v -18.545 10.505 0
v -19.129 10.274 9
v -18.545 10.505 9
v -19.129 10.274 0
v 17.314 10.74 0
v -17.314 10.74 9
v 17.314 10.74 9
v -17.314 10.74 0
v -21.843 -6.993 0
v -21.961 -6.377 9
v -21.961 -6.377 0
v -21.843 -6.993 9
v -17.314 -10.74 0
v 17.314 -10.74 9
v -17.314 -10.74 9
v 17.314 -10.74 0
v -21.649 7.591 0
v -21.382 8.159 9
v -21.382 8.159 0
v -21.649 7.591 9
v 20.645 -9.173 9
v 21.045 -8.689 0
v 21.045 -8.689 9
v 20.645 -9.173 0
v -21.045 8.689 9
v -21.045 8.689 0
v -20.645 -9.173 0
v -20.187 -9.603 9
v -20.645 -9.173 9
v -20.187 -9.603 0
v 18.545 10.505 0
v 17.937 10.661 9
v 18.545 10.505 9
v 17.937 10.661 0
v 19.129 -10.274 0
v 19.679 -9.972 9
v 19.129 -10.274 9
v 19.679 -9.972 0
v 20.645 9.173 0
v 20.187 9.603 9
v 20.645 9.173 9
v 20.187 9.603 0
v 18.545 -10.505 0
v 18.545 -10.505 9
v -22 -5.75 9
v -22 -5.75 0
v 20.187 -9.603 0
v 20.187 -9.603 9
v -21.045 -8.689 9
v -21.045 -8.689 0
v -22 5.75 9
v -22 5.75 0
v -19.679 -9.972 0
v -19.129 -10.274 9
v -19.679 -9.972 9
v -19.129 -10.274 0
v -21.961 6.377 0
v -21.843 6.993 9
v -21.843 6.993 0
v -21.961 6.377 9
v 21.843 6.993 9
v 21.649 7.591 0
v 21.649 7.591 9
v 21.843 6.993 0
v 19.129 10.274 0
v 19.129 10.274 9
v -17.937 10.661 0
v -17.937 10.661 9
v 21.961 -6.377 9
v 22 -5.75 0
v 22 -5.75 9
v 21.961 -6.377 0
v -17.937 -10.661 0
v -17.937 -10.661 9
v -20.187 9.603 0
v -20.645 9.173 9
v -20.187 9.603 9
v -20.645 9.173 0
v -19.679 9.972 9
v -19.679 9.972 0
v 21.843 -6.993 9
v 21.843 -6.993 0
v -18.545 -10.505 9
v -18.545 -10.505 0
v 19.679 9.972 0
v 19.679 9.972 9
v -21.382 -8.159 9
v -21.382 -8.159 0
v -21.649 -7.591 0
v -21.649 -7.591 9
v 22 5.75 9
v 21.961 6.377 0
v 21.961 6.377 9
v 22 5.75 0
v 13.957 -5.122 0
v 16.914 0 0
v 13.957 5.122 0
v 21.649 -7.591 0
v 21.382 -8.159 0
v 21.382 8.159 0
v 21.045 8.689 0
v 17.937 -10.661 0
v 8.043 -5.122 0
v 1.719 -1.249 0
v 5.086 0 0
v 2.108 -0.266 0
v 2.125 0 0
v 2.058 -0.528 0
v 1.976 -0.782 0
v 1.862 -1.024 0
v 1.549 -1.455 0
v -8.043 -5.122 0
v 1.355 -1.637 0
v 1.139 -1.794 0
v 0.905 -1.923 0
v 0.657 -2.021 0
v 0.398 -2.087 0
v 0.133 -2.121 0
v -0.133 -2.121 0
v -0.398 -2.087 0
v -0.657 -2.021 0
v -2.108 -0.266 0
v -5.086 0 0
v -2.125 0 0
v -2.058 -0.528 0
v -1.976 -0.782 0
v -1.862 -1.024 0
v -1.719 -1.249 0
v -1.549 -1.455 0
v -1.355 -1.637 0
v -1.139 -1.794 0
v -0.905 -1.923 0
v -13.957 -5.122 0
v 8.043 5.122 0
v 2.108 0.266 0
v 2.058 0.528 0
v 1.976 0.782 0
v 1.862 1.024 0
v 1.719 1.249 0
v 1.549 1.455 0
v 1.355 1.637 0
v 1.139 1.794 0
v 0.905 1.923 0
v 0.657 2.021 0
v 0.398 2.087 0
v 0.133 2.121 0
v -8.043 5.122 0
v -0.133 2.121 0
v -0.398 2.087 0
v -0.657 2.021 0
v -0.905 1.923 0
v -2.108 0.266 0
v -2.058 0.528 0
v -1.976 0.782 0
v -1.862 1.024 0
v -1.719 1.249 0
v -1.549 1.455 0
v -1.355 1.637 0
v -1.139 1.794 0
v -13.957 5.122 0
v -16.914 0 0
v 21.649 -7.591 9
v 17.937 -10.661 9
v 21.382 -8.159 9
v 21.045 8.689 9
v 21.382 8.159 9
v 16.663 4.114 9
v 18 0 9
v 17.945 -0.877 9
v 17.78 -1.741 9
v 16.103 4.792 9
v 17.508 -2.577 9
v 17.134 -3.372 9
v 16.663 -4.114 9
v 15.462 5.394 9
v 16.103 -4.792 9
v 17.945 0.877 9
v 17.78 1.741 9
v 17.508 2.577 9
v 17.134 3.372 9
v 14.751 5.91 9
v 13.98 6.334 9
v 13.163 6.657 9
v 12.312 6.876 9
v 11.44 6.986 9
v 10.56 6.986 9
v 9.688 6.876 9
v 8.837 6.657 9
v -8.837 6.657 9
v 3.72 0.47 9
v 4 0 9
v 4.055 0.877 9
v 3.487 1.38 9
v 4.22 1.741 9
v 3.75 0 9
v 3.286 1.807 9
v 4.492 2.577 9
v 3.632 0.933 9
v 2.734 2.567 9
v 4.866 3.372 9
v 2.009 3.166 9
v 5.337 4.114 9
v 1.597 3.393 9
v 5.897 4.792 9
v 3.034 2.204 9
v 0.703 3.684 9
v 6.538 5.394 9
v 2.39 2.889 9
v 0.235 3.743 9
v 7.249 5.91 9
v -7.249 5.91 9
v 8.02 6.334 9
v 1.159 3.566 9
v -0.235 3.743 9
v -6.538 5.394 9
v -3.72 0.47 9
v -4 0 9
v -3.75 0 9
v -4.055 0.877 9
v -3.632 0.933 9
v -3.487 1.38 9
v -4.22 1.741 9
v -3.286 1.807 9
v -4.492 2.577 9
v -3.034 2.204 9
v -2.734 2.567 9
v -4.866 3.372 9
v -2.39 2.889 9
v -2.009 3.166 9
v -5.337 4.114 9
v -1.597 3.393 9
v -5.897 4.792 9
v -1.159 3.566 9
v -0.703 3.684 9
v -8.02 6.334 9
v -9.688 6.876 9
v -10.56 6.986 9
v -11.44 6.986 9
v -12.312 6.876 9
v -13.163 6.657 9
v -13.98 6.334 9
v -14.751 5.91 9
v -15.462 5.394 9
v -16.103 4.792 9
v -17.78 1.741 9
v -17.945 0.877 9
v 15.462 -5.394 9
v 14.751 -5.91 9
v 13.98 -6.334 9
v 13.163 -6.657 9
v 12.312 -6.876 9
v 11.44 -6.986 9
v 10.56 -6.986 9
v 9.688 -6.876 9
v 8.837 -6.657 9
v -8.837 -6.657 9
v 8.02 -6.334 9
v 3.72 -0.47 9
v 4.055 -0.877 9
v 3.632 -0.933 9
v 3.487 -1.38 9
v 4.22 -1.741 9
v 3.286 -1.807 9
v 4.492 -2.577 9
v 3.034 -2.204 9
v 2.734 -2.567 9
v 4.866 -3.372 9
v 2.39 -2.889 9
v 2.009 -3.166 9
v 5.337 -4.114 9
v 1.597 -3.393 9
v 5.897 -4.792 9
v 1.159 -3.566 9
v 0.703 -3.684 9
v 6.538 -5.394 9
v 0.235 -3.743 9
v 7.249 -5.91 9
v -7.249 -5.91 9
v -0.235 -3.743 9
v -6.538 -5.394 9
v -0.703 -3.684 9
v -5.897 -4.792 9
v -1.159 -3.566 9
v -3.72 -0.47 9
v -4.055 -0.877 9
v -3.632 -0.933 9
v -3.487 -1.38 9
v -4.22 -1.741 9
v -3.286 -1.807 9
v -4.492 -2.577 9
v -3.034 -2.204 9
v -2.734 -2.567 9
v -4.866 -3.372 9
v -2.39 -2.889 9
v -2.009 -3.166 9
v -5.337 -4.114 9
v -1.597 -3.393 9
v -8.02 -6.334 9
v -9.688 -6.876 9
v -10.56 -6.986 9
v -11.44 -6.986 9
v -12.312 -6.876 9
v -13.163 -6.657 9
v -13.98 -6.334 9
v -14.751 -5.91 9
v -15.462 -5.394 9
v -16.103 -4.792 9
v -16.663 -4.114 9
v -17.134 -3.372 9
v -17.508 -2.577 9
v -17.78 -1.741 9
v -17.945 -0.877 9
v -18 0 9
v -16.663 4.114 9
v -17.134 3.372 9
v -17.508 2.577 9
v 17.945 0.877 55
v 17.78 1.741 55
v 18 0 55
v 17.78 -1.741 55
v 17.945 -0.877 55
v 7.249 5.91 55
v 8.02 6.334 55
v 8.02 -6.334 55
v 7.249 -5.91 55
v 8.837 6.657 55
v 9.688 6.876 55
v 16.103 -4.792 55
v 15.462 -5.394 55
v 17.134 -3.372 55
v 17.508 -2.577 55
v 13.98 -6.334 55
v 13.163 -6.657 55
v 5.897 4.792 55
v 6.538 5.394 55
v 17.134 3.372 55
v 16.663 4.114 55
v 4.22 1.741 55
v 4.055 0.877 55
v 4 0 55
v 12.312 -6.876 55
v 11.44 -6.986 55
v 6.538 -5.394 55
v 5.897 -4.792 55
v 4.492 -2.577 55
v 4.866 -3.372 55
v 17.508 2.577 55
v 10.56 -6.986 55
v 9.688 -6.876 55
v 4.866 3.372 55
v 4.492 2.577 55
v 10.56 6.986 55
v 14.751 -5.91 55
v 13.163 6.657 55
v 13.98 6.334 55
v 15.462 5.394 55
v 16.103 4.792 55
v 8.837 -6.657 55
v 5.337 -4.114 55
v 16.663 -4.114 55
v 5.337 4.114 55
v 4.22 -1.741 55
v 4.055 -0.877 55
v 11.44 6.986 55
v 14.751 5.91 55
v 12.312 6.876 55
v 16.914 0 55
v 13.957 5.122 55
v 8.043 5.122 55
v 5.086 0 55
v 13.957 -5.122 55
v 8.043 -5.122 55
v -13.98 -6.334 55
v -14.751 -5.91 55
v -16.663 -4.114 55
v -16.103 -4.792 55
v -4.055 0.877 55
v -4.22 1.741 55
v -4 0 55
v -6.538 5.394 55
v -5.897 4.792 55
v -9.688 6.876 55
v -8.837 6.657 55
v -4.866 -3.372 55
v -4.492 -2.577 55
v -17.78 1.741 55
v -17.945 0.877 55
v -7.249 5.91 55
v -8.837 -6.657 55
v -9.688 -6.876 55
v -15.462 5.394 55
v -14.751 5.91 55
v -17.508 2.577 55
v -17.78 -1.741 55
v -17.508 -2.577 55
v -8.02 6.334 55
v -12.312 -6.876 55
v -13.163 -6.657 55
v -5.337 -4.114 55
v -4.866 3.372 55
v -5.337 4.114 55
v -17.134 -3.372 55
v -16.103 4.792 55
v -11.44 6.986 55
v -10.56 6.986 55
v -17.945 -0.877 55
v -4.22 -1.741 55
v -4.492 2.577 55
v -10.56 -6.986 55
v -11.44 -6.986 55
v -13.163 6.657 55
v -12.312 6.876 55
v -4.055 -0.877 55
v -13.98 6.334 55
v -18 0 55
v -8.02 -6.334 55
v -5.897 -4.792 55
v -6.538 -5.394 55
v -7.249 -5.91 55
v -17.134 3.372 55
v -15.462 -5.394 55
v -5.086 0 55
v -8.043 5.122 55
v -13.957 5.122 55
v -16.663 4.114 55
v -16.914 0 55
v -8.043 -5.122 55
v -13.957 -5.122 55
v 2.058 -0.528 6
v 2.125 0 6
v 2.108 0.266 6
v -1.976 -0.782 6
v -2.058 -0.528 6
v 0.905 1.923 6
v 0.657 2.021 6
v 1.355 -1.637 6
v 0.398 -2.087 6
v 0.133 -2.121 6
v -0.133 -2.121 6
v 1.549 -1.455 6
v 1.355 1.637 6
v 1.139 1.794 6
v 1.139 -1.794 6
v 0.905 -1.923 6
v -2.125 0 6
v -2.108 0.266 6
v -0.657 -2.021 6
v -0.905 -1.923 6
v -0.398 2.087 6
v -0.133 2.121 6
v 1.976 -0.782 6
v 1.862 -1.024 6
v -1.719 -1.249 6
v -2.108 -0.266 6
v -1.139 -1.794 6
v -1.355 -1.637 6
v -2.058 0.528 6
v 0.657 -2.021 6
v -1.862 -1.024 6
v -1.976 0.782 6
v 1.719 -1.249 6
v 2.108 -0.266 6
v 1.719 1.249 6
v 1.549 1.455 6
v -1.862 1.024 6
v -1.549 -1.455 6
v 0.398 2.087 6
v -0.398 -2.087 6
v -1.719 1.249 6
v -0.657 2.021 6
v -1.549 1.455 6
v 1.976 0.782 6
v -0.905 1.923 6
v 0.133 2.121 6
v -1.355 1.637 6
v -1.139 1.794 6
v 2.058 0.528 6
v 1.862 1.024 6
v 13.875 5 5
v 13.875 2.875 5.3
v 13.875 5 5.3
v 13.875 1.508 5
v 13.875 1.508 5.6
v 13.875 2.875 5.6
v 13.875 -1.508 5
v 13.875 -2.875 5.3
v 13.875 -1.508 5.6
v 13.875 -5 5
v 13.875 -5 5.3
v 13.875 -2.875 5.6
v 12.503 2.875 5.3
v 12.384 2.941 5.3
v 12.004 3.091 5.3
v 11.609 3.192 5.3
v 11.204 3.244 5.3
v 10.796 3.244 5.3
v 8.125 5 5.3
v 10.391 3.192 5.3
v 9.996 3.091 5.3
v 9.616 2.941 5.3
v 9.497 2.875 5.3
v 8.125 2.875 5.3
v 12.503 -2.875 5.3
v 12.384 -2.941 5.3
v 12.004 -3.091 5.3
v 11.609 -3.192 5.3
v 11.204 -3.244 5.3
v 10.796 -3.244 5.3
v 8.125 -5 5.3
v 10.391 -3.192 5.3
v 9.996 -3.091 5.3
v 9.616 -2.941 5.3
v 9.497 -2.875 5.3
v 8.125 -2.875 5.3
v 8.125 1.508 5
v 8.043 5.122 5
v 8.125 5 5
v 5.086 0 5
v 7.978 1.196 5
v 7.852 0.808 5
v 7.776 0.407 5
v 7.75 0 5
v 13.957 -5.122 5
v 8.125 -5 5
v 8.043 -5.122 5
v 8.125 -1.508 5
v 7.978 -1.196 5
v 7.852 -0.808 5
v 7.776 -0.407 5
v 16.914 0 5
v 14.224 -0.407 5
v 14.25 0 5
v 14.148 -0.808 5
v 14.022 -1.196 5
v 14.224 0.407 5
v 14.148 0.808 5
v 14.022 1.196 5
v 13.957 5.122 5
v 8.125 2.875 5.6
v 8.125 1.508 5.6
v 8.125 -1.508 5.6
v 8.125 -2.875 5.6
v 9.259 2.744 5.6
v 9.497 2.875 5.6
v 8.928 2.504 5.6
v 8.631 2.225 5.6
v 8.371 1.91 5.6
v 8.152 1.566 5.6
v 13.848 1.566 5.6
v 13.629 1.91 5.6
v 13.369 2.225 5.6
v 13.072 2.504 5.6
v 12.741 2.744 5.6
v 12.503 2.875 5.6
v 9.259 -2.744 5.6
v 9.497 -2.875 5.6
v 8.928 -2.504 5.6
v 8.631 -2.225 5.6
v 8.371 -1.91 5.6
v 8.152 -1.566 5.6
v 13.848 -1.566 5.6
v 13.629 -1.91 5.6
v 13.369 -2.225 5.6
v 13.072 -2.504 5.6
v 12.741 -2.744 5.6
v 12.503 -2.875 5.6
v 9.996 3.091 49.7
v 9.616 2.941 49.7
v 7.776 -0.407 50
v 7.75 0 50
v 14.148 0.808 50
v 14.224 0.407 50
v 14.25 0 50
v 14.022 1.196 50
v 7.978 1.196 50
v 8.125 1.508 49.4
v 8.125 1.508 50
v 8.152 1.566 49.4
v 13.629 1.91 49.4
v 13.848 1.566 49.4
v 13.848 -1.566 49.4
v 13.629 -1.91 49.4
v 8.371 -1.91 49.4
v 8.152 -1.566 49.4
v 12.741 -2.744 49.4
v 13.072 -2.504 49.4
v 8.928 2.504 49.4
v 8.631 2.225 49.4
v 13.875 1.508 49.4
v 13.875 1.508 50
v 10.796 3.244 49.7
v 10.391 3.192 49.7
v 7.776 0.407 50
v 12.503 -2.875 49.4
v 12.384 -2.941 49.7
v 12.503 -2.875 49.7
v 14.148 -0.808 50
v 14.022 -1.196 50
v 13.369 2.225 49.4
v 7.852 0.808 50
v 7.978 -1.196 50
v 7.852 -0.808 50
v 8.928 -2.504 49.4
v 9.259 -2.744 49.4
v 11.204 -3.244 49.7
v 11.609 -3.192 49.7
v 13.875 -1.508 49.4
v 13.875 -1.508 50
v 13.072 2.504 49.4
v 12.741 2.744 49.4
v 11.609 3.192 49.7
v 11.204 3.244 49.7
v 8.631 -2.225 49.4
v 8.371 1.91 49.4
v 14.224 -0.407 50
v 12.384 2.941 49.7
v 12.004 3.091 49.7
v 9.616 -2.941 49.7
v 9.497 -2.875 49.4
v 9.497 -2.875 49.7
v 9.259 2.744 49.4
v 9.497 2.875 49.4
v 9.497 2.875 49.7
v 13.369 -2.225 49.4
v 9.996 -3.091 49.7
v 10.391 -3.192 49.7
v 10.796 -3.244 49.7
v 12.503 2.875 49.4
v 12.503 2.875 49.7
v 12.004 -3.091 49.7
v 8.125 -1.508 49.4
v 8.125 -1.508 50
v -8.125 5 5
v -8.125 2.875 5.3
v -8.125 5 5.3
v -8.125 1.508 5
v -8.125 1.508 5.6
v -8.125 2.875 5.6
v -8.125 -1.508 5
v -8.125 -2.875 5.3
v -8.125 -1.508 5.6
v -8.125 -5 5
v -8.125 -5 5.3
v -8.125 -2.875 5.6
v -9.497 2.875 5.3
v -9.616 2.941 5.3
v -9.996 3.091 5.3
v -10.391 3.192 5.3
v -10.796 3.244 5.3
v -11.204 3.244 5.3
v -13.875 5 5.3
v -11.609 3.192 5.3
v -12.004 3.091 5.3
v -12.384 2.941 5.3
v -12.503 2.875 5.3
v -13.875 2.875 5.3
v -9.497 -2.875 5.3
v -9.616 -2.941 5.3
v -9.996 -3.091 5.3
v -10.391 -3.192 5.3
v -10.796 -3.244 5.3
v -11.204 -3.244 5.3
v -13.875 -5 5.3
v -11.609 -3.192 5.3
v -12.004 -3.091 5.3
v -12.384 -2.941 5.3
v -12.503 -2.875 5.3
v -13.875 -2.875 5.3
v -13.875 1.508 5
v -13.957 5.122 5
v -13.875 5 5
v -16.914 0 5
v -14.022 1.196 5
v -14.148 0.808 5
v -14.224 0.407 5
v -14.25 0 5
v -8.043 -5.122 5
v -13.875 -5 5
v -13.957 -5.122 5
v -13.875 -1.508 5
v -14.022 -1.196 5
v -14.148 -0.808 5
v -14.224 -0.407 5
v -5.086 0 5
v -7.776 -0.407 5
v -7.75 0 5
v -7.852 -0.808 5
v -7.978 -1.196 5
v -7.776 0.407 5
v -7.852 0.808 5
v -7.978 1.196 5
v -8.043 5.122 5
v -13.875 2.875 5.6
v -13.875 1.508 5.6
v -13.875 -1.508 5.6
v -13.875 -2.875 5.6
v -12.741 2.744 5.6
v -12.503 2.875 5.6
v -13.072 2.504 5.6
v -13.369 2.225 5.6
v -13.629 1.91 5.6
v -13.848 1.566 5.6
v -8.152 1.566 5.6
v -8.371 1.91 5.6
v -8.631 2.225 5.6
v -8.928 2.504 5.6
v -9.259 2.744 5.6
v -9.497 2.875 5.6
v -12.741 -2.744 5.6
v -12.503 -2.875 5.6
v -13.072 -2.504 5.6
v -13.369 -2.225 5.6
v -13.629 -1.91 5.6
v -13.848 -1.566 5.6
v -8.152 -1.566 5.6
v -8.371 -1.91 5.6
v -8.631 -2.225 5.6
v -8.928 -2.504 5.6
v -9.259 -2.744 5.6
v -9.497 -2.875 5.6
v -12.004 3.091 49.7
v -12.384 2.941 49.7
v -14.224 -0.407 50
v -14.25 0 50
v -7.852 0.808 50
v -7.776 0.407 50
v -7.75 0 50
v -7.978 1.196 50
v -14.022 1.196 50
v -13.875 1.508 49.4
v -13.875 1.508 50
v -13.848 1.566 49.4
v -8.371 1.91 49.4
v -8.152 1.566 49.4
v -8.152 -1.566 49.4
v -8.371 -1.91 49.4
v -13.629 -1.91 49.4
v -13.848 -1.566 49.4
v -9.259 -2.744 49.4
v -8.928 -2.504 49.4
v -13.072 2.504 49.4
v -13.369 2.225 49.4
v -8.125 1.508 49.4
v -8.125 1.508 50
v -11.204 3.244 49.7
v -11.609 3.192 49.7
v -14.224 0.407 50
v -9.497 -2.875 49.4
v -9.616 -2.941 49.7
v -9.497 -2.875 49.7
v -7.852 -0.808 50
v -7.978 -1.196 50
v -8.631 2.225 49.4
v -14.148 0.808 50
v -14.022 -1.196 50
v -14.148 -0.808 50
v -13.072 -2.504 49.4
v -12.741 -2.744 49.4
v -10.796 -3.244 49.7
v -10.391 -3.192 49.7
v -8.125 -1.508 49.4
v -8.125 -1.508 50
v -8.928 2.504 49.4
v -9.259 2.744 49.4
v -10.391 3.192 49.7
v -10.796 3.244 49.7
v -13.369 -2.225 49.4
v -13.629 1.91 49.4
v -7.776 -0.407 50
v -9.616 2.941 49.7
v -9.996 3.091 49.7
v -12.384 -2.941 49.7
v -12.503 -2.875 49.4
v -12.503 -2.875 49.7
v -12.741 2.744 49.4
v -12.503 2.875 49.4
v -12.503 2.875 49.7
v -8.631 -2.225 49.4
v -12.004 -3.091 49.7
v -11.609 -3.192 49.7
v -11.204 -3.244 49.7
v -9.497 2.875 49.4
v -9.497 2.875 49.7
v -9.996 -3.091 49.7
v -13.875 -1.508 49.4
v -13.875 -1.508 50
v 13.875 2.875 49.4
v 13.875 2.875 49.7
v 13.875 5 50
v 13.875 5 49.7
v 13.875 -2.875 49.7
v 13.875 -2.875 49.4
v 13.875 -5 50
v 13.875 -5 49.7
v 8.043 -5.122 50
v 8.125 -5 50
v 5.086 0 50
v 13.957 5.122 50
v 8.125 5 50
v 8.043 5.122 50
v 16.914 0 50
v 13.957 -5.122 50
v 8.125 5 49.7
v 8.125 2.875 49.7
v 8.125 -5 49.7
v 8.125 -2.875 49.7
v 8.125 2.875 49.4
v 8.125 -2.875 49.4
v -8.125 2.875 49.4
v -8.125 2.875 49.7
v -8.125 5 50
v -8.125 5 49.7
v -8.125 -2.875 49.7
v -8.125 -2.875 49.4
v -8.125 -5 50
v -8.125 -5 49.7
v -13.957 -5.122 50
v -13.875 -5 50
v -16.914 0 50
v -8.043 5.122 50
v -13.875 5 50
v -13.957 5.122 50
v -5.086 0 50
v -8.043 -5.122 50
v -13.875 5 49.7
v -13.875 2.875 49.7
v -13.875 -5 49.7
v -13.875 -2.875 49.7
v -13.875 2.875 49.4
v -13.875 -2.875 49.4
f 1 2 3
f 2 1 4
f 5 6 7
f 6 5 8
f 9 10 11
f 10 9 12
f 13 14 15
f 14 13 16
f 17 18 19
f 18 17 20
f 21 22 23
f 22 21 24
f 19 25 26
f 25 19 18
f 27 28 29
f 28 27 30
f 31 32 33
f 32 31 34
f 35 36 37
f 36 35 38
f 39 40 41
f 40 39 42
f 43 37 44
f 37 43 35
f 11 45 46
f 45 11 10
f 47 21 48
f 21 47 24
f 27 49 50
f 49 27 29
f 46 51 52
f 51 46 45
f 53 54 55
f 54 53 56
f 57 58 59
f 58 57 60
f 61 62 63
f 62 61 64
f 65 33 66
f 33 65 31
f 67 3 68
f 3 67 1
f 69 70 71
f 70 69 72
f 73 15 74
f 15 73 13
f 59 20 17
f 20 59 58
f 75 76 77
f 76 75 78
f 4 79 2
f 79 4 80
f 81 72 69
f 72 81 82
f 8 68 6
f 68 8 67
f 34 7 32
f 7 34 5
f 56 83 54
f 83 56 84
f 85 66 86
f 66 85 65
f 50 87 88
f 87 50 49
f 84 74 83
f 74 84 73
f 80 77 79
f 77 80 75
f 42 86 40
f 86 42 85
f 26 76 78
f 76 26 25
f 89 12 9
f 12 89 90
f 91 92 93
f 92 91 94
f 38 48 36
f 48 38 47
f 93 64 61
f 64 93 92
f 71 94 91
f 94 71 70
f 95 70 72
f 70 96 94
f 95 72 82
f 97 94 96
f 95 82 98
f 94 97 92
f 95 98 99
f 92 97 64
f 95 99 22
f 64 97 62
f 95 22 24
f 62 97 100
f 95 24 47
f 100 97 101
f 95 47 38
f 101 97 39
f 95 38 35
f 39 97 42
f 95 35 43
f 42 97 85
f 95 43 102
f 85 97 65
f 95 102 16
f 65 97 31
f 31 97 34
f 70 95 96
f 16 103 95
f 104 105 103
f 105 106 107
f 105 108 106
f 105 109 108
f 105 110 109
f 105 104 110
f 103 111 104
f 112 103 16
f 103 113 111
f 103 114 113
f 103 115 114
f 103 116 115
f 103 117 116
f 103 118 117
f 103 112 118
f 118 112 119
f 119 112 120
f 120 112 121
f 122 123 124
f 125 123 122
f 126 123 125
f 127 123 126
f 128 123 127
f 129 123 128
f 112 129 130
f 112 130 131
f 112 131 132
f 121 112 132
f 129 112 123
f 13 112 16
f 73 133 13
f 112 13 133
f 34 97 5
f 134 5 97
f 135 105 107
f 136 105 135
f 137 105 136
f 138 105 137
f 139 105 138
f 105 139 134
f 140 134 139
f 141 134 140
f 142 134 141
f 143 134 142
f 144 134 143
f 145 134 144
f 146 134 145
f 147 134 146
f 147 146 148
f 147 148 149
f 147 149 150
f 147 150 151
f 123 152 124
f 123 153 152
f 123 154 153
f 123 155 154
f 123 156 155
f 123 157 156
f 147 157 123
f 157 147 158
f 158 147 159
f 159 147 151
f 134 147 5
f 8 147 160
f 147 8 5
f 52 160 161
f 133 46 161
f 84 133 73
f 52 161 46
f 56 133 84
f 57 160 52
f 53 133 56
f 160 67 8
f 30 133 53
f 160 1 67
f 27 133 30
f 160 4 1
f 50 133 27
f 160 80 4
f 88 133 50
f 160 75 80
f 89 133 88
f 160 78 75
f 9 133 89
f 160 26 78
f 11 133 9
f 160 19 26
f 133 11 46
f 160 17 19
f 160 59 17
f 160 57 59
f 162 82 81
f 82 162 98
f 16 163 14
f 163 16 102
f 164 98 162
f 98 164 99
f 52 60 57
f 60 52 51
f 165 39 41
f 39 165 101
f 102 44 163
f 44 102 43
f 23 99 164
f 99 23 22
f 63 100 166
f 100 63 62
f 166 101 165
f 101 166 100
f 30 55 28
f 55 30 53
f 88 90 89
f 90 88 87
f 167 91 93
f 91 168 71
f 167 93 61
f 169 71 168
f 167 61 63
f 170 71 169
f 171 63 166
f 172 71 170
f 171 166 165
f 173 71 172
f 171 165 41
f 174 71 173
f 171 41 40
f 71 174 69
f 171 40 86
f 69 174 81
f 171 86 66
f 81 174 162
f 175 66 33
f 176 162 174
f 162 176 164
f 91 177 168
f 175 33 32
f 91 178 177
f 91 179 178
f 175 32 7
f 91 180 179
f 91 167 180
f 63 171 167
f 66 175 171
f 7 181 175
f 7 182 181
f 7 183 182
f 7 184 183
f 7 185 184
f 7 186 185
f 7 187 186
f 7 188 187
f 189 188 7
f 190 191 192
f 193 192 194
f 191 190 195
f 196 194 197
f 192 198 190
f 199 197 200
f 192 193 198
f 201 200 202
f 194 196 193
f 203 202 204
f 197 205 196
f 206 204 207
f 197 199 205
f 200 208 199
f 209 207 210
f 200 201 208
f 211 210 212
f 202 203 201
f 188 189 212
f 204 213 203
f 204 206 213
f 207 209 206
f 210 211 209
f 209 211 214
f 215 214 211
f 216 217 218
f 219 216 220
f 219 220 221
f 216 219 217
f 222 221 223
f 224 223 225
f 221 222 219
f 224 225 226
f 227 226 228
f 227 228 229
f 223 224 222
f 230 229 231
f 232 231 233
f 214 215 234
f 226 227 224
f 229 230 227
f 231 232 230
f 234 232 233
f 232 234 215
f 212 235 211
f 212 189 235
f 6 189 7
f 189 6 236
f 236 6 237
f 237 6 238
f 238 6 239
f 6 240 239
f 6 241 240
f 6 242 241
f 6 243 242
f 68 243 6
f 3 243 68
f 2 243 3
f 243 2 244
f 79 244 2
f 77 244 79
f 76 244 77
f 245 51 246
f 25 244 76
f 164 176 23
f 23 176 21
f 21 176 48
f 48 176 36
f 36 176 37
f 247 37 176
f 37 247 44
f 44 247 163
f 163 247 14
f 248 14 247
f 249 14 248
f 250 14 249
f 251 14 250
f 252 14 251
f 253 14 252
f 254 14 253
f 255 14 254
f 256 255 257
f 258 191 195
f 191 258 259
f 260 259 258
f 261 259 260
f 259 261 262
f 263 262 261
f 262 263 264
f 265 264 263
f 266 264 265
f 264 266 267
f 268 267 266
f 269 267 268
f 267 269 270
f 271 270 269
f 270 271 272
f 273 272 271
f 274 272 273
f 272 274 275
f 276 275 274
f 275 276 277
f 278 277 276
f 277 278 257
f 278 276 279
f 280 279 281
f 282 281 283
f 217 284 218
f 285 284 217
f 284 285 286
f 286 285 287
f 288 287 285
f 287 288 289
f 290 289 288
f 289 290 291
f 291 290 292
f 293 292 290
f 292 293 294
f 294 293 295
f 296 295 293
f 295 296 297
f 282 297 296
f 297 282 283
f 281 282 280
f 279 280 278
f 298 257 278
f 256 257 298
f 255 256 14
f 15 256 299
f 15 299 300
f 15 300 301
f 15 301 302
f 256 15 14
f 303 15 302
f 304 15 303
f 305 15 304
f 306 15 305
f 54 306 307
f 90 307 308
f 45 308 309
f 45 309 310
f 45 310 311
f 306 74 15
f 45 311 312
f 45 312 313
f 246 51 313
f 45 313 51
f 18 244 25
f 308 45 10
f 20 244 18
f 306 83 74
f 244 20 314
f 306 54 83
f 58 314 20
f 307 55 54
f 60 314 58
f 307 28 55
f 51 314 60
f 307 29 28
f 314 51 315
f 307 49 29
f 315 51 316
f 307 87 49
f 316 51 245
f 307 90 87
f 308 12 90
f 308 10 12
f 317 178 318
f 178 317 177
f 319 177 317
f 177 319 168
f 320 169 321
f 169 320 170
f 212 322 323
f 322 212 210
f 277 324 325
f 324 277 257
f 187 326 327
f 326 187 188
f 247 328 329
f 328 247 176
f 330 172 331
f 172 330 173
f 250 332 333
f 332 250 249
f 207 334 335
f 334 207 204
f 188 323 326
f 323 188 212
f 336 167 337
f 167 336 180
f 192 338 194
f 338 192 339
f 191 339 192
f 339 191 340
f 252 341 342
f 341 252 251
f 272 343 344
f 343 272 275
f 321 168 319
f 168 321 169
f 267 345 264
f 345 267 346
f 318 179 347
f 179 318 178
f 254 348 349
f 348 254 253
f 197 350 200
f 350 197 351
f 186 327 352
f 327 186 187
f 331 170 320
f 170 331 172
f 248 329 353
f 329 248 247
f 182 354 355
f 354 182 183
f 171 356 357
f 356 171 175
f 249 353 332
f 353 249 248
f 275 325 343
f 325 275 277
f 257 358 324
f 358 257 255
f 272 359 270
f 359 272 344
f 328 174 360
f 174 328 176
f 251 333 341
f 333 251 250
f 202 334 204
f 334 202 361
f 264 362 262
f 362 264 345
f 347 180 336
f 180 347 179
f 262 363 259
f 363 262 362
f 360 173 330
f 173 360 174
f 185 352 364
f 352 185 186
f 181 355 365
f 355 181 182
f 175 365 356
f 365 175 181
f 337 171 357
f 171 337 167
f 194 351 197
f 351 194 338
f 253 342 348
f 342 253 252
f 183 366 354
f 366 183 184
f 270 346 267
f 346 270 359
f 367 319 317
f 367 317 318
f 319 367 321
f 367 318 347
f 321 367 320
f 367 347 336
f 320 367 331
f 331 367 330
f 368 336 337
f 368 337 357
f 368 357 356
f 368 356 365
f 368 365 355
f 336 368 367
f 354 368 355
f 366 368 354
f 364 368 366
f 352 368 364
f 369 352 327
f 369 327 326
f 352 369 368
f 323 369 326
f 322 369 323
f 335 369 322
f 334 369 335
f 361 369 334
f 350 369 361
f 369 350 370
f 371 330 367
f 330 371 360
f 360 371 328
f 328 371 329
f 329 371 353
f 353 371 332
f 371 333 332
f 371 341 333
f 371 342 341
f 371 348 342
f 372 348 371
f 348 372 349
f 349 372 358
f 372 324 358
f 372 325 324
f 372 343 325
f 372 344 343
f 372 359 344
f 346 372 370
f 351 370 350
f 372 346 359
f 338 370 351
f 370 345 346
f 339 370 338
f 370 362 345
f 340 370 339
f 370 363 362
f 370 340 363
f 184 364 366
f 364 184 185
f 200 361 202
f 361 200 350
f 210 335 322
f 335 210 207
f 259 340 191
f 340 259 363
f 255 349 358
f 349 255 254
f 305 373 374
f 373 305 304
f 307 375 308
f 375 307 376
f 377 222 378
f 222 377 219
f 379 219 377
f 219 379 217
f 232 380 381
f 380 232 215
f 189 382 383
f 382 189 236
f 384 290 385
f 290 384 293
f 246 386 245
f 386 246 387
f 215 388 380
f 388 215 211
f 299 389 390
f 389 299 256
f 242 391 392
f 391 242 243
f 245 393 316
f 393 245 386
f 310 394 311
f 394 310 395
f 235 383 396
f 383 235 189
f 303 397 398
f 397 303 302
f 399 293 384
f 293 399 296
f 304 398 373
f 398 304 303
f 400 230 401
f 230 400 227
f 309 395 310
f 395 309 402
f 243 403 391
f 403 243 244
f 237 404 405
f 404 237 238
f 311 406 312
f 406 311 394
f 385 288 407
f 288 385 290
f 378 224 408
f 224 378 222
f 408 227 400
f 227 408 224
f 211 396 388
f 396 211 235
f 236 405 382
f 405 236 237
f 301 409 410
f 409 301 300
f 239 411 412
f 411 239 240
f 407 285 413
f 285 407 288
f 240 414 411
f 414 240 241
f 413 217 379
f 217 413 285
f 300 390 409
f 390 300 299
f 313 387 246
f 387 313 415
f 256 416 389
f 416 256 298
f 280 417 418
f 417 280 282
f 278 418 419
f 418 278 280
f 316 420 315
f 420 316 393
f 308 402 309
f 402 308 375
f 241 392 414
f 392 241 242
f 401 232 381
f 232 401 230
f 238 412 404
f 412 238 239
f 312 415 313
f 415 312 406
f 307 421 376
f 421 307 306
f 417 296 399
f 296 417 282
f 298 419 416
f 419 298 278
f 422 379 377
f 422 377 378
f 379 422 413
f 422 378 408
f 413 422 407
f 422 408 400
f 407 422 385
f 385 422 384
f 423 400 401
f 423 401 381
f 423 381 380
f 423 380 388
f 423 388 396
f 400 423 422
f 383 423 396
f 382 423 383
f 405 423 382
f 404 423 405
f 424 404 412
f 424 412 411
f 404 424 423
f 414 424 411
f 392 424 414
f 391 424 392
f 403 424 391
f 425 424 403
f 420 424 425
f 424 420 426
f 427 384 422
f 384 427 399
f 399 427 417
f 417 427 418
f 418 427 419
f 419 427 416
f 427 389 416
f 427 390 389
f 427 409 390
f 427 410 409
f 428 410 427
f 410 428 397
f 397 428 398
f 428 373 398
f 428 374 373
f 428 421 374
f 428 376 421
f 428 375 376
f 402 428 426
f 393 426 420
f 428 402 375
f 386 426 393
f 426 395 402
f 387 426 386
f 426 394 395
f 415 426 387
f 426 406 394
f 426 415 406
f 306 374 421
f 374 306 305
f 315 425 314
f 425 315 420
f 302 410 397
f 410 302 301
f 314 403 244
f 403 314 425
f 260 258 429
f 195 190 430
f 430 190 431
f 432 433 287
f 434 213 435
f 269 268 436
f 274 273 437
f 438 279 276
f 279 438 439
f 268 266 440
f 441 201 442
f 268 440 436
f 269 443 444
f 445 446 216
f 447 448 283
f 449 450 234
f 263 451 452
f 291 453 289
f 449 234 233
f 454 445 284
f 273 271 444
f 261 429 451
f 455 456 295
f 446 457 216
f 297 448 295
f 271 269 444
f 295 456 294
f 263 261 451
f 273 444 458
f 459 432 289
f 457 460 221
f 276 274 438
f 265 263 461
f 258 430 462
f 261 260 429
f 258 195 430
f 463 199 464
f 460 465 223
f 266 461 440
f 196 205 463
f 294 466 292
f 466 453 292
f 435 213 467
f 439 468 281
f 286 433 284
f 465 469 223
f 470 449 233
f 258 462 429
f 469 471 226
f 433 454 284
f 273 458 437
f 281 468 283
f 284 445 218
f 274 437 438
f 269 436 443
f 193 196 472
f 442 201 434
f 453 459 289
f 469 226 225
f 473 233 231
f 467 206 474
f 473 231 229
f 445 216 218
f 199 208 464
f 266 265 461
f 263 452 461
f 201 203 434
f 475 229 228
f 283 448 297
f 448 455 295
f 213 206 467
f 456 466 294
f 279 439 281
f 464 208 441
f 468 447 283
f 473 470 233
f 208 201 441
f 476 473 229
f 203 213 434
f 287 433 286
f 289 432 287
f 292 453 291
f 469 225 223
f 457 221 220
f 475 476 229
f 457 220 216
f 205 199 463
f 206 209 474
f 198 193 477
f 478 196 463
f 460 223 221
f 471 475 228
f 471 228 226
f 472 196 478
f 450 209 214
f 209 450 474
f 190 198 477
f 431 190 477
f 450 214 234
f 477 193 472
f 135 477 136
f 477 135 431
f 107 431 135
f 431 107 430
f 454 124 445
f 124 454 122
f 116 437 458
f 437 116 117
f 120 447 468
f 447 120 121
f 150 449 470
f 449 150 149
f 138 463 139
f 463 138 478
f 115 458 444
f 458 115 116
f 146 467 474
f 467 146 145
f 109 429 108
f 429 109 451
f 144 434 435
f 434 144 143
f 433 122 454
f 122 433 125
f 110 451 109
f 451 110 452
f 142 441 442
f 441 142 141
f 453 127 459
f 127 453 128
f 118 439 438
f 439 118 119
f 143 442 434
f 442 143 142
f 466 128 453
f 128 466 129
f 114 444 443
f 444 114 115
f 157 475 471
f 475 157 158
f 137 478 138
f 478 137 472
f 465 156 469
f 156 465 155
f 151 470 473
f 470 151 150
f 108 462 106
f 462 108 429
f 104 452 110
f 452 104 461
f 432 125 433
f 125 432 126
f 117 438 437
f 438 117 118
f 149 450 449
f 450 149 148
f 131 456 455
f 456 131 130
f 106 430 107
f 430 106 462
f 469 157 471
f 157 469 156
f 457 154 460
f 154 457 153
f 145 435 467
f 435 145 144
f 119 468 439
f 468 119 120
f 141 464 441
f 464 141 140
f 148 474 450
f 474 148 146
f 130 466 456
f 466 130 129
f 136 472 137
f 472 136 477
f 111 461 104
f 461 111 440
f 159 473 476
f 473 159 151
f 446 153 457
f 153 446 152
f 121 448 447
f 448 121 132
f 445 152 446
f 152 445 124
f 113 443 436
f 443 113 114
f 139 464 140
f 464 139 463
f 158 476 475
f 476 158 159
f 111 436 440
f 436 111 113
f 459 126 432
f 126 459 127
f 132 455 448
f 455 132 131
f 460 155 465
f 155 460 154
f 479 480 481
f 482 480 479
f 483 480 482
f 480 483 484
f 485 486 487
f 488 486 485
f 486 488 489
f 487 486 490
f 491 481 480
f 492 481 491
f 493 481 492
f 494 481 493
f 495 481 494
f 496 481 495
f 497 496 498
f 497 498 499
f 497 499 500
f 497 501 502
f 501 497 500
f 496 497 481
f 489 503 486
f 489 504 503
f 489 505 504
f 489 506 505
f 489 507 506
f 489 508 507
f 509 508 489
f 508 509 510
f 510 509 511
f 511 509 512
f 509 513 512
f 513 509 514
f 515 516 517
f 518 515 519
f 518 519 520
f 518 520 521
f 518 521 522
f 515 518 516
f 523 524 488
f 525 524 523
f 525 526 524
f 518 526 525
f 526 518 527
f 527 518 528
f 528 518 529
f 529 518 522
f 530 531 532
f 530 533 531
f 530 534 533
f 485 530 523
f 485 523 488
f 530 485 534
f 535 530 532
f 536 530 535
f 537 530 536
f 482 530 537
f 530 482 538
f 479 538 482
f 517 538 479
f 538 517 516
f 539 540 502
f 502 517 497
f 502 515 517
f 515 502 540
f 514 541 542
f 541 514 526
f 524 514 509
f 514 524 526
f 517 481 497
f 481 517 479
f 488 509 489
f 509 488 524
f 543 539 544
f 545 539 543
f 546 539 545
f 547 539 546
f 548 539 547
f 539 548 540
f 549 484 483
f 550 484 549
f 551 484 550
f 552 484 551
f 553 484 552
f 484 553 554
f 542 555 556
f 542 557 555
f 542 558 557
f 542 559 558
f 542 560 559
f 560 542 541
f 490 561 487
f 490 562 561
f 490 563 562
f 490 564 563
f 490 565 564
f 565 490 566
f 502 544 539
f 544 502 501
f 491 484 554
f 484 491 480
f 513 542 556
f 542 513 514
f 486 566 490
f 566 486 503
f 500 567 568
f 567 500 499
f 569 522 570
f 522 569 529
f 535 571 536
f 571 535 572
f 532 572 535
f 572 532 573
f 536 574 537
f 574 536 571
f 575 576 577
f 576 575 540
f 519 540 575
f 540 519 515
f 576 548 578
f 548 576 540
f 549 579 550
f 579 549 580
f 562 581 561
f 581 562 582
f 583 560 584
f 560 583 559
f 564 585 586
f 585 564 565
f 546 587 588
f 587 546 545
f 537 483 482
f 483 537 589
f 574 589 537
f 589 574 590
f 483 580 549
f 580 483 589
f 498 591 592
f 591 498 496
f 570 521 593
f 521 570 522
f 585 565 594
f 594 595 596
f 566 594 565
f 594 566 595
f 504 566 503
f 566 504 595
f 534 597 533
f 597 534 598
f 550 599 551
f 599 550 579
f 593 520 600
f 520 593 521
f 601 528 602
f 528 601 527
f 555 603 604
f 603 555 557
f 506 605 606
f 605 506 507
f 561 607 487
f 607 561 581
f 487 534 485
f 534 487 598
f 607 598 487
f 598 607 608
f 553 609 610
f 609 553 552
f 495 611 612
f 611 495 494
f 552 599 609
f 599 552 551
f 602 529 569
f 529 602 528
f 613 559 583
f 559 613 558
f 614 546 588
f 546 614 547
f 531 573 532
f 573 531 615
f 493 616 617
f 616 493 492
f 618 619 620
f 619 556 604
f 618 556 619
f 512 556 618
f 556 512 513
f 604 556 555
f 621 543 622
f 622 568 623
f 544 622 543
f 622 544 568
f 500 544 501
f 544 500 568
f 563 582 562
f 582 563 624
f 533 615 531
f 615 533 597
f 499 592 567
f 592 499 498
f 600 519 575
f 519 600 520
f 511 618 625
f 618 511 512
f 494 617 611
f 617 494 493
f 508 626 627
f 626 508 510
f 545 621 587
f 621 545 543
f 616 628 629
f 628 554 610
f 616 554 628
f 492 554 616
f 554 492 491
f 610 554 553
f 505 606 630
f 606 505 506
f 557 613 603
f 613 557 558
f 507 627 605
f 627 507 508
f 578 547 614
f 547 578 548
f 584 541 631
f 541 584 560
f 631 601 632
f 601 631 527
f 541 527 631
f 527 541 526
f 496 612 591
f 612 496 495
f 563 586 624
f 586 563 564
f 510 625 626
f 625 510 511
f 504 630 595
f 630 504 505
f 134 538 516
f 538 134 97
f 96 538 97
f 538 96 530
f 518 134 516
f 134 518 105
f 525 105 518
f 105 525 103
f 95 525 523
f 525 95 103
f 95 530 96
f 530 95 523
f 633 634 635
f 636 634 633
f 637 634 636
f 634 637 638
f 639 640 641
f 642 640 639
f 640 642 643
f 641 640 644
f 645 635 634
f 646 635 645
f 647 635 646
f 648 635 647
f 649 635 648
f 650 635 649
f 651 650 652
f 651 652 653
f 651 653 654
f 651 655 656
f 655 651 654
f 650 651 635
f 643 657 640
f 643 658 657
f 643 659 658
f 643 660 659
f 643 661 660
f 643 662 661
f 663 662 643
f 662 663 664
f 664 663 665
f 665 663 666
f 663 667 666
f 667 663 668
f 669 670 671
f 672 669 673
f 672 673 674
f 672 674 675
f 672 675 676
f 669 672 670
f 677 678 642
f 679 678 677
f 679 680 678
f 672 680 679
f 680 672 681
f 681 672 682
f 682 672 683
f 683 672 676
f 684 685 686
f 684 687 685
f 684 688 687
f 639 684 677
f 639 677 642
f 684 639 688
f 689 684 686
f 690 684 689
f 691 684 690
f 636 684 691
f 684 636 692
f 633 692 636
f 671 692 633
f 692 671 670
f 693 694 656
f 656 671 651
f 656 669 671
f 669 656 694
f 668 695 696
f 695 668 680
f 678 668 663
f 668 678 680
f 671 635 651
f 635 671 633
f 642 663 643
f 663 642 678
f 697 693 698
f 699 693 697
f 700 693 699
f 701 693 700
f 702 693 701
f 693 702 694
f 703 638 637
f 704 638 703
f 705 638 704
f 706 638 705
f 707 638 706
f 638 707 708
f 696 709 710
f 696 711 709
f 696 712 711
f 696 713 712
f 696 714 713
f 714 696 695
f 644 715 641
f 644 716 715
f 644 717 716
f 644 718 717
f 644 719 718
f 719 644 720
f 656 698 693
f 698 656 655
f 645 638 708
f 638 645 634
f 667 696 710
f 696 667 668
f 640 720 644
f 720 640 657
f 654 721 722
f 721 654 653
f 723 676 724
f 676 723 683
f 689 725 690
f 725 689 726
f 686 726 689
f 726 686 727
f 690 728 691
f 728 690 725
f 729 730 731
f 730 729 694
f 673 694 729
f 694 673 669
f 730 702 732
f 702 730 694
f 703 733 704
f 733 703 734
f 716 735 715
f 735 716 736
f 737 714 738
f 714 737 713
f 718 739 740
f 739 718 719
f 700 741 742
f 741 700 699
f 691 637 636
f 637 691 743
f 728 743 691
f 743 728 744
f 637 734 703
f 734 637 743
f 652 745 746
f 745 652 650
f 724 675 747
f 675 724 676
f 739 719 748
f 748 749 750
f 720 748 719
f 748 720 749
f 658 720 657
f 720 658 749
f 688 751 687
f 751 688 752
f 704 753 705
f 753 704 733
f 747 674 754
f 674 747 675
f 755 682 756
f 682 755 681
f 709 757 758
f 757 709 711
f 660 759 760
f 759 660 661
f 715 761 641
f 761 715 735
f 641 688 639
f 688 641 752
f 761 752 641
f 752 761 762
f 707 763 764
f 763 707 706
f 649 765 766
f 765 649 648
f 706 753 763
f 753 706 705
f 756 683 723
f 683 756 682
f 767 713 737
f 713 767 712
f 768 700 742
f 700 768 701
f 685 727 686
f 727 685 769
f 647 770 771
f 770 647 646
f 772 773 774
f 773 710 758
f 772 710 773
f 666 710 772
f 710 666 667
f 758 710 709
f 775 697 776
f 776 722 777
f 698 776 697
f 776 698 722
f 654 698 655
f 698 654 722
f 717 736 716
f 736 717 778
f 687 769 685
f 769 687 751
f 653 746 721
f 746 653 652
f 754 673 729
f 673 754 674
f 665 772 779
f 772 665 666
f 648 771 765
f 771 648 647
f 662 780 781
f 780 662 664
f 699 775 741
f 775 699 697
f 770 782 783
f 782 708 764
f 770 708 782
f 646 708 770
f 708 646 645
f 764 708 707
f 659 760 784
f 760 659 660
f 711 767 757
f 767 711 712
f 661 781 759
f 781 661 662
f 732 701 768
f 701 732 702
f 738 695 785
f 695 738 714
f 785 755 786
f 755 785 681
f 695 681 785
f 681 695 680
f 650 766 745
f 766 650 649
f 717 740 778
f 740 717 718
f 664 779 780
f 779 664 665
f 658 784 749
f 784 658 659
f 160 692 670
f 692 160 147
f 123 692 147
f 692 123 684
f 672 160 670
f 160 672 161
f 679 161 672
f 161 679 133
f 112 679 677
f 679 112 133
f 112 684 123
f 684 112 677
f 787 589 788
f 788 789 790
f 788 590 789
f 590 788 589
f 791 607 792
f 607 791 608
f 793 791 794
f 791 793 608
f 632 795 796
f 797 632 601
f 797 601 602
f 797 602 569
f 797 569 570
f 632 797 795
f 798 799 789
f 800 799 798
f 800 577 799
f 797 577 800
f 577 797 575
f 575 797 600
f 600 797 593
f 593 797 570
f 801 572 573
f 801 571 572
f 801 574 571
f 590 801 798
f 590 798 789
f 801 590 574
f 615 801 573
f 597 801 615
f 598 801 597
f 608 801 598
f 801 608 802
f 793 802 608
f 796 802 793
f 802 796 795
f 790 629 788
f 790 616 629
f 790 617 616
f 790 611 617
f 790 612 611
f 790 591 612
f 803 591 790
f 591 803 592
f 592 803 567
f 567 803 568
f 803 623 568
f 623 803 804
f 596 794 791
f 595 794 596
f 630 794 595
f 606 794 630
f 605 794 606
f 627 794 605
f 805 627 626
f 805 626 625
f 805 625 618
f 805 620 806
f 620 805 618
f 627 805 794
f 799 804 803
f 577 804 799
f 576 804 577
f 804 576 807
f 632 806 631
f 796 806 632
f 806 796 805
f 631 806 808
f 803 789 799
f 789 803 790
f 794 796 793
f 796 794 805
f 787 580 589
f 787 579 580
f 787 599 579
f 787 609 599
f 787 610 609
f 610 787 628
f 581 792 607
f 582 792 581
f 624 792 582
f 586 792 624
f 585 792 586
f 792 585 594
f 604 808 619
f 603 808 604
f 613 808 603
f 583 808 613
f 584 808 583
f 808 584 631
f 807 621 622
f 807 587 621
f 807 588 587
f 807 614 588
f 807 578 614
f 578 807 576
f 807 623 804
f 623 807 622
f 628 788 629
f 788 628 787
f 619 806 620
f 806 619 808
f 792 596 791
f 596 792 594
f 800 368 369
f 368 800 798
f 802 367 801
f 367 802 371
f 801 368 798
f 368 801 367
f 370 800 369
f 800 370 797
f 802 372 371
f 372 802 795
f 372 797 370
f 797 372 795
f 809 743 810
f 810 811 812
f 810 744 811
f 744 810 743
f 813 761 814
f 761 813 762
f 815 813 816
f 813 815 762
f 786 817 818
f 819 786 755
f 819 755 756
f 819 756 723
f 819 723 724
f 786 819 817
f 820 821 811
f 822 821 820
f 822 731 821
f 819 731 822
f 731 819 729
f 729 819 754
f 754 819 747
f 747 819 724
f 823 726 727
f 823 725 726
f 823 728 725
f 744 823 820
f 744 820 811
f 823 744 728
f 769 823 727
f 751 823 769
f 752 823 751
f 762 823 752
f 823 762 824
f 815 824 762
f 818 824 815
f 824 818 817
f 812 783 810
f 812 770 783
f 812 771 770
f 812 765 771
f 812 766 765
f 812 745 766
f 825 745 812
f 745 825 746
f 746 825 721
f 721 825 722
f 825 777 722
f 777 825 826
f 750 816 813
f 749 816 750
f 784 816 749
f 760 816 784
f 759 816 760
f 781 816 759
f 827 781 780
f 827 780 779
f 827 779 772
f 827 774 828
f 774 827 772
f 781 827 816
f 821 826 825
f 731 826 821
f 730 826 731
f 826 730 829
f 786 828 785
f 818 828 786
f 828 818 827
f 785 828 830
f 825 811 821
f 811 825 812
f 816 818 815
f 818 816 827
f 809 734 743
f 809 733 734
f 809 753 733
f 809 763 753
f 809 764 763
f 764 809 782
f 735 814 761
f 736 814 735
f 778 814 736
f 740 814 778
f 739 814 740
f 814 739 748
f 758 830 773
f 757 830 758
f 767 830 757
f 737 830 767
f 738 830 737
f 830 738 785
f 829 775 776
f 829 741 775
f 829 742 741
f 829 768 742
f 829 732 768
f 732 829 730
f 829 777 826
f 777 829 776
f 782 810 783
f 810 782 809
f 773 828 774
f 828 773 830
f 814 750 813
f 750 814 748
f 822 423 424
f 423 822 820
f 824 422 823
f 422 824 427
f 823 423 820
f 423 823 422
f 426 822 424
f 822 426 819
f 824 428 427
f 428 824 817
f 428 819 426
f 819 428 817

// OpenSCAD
$fn = 50;


difference() {
	union() {
		hull() {
			translate(v = [-17.0000000000, 5.7500000000, 0]) {
				cylinder(h = 9, r = 5);
			}
			translate(v = [17.0000000000, 5.7500000000, 0]) {
				cylinder(h = 9, r = 5);
			}
			translate(v = [-17.0000000000, -5.7500000000, 0]) {
				cylinder(h = 9, r = 5);
			}
			translate(v = [17.0000000000, -5.7500000000, 0]) {
				cylinder(h = 9, r = 5);
			}
		}
		translate(v = [11.0000000000, 0, 0.0000000000]) {
			cylinder(h = 55, r = 7.0000000000);
		}
		translate(v = [-11.0000000000, 0, 0.0000000000]) {
			cylinder(h = 55, r = 7.0000000000);
		}
	}
	union() {
		translate(v = [0, 0, 9]) {
			rotate(a = [0, 0, 0]) {
				difference() {
					union() {
						#translate(v = [0, 0, -50.0000000000]) {
							cylinder(h = 50, r = 2.0000000000);
						}
						#translate(v = [0, 0, -3]) {
							cylinder(h = 3, r1 = 2.1250000000, r2 = 3.7500000000);
						}
						#translate(v = [0, 0, -50.0000000000]) {
							cylinder(h = 50, r = 2.1250000000);
						}
						#translate(v = [0, 0, -50.0000000000]) {
							cylinder(h = 50, r = 2.0000000000);
						}
					}
					union();
				}
			}
		}
		translate(v = [11.0000000000, 0, 0]) {
			rotate(a = [0, 0, 0]) {
				difference() {
					union() {
						#translate(v = [-2.8750000000, -5.0000000000, -0.3000000000]) {
							cube(size = [5.7500000000, 10, 0.3000000000]);
						}
						#translate(v = [-2.8750000000, -2.8750000000, -0.6000000000]) {
							cube(size = [5.7500000000, 5.7500000000, 0.3000000000]);
						}
						#translate(v = [-2.8750000000, -5.0000000000, 5]) {
							cube(size = [5.7500000000, 10, 0.3000000000]);
						}
						#translate(v = [-2.8750000000, -2.8750000000, 5.3000000000]) {
							cube(size = [5.7500000000, 5.7500000000, 0.3000000000]);
						}
						#translate(v = [0, 0, -100.0000000000]) {
							cylinder(h = 200, r = 3.2500000000);
						}
						#linear_extrude(height = 5) {
							polygon(points = [[5.9142500000, 0.0000000000], [2.9571250000, 5.1218907443], [-2.9571250000, 5.1218907443], [-5.9142500000, 0.0000000000], [-2.9571250000, -5.1218907443], [2.9571250000, -5.1218907443]]);
						}
						#translate(v = [-2.8750000000, -5.0000000000, -0.3000000000]) {
							cube(size = [5.7500000000, 10, 0.3000000000]);
						}
						#translate(v = [-2.8750000000, -2.8750000000, -0.6000000000]) {
							cube(size = [5.7500000000, 5.7500000000, 0.3000000000]);
						}
						#translate(v = [-2.8750000000, -5.0000000000, 5]) {
							cube(size = [5.7500000000, 10, 0.3000000000]);
						}
						#translate(v = [-2.8750000000, -2.8750000000, 5.3000000000]) {
							cube(size = [5.7500000000, 5.7500000000, 0.3000000000]);
						}
						#translate(v = [0, 0, -100.0000000000]) {
							cylinder(h = 200, r = 3.2500000000);
						}
						#translate(v = [-2.8750000000, -5.0000000000, -0.3000000000]) {
							cube(size = [5.7500000000, 10, 0.3000000000]);
						}
						#translate(v = [-2.8750000000, -2.8750000000, -0.6000000000]) {
							cube(size = [5.7500000000, 5.7500000000, 0.3000000000]);
						}
						#translate(v = [-2.8750000000, -5.0000000000, 5]) {
							cube(size = [5.7500000000, 10, 0.3000000000]);
						}
						#translate(v = [-2.8750000000, -2.8750000000, 5.3000000000]) {
							cube(size = [5.7500000000, 5.7500000000, 0.3000000000]);
						}
						#translate(v = [0, 0, -100.0000000000]) {
							cylinder(h = 200, r = 3.2500000000);
						}
					}
					union();
				}
			}
		}
		translate(v = [-11.0000000000, 0, 0]) {
			rotate(a = [0, 0, 0]) {
				difference() {
					union() {
						#translate(v = [-2.8750000000, -5.0000000000, -0.3000000000]) {
							cube(size = [5.7500000000, 10, 0.3000000000]);
						}
						#translate(v = [-2.8750000000, -2.8750000000, -0.6000000000]) {
							cube(size = [5.7500000000, 5.7500000000, 0.3000000000]);
						}
						#translate(v = [-2.8750000000, -5.0000000000, 5]) {
							cube(size = [5.7500000000, 10, 0.3000000000]);
						}
						#translate(v = [-2.8750000000, -2.8750000000, 5.3000000000]) {
							cube(size = [5.7500000000, 5.7500000000, 0.3000000000]);
						}
						#translate(v = [0, 0, -100.0000000000]) {
							cylinder(h = 200, r = 3.2500000000);
						}
						#linear_extrude(height = 5) {
							polygon(points = [[5.9142500000, 0.0000000000], [2.9571250000, 5.1218907443], [-2.9571250000, 5.1218907443], [-5.9142500000, 0.0000000000], [-2.9571250000, -5.1218907443], [2.9571250000, -5.1218907443]]);
						}
						#translate(v = [-2.8750000000, -5.0000000000, -0.3000000000]) {
							cube(size = [5.7500000000, 10, 0.3000000000]);
						}
						#translate(v = [-2.8750000000, -2.8750000000, -0.6000000000]) {
							cube(size = [5.7500000000, 5.7500000000, 0.3000000000]);
						}
						#translate(v = [-2.8750000000, -5.0000000000, 5]) {
							cube(size = [5.7500000000, 10, 0.3000000000]);
						}
						#translate(v = [-2.8750000000, -2.8750000000, 5.3000000000]) {
							cube(size = [5.7500000000, 5.7500000000, 0.3000000000]);
						}
						#translate(v = [0, 0, -100.0000000000]) {
							cylinder(h = 200, r = 3.2500000000);
						}
						#translate(v = [-2.8750000000, -5.0000000000, -0.3000000000]) {
							cube(size = [5.7500000000, 10, 0.3000000000]);
						}
						#translate(v = [-2.8750000000, -2.8750000000, -0.6000000000]) {
							cube(size = [5.7500000000, 5.7500000000, 0.3000000000]);
						}
						#translate(v = [-2.8750000000, -5.0000000000, 5]) {
							cube(size = [5.7500000000, 10, 0.3000000000]);
						}
						#translate(v = [-2.8750000000, -2.8750000000, 5.3000000000]) {
							cube(size = [5.7500000000, 5.7500000000, 0.3000000000]);
						}
						#translate(v = [0, 0, -100.0000000000]) {
							cylinder(h = 200, r = 3.2500000000);
						}
					}
					union();
				}
			}
		}
		translate(v = [11.0000000000, 0, 55]) {
			rotate(a = [0, 0, 0]) {
				difference() {
					union() {
						#translate(v = [-2.8750000000, -5.0000000000, -5.3000000000]) {
							cube(size = [5.7500000000, 10, 0.3000000000]);
						}
						#translate(v = [-2.8750000000, -2.8750000000, -5.6000000000]) {
							cube(size = [5.7500000000, 5.7500000000, 0.3000000000]);
						}
						#translate(v = [-2.8750000000, -5.0000000000, 0]) {
							cube(size = [5.7500000000, 10, 0.3000000000]);
						}
						#translate(v = [-2.8750000000, -2.8750000000, 0.3000000000]) {
							cube(size = [5.7500000000, 5.7500000000, 0.3000000000]);
						}
						#translate(v = [0, 0, -100.0000000000]) {
							cylinder(h = 200, r = 3.2500000000);
						}
						translate(v = [0, 0, -5]) {
							#linear_extrude(height = 5) {
								polygon(points = [[5.9142500000, 0.0000000000], [2.9571250000, 5.1218907443], [-2.9571250000, 5.1218907443], [-5.9142500000, 0.0000000000], [-2.9571250000, -5.1218907443], [2.9571250000, -5.1218907443]]);
							}
						}
						#translate(v = [-2.8750000000, -5.0000000000, -5.3000000000]) {
							cube(size = [5.7500000000, 10, 0.3000000000]);
						}
						#translate(v = [-2.8750000000, -2.8750000000, -5.6000000000]) {
							cube(size = [5.7500000000, 5.7500000000, 0.3000000000]);
						}
						#translate(v = [-2.8750000000, -5.0000000000, 0]) {
							cube(size = [5.7500000000, 10, 0.3000000000]);
						}
						#translate(v = [-2.8750000000, -2.8750000000, 0.3000000000]) {
							cube(size = [5.7500000000, 5.7500000000, 0.3000000000]);
						}
						#translate(v = [0, 0, -100.0000000000]) {
							cylinder(h = 200, r = 3.2500000000);
						}
						#translate(v = [-2.8750000000, -5.0000000000, -5.3000000000]) {
							cube(size = [5.7500000000, 10, 0.3000000000]);
						}
						#translate(v = [-2.8750000000, -2.8750000000, -5.6000000000]) {
							cube(size = [5.7500000000, 5.7500000000, 0.3000000000]);
						}
						#translate(v = [-2.8750000000, -5.0000000000, 0]) {
							cube(size = [5.7500000000, 10, 0.3000000000]);
						}
						#translate(v = [-2.8750000000, -2.8750000000, 0.3000000000]) {
							cube(size = [5.7500000000, 5.7500000000, 0.3000000000]);
						}
						#translate(v = [0, 0, -100.0000000000]) {
							cylinder(h = 200, r = 3.2500000000);
						}
					}
					union();
				}
			}
		}
		translate(v = [-11.0000000000, 0, 55]) {
			rotate(a = [0, 0, 0]) {
				difference() {
					union() {
						#translate(v = [-2.8750000000, -5.0000000000, -5.3000000000]) {
							cube(size = [5.7500000000, 10, 0.3000000000]);
						}
						#translate(v = [-2.8750000000, -2.8750000000, -5.6000000000]) {
							cube(size = [5.7500000000, 5.7500000000, 0.3000000000]);
						}
						#translate(v = [-2.8750000000, -5.0000000000, 0]) {
							cube(size = [5.7500000000, 10, 0.3000000000]);
						}
						#translate(v = [-2.8750000000, -2.8750000000, 0.3000000000]) {
							cube(size = [5.7500000000, 5.7500000000, 0.3000000000]);
						}
						#translate(v = [0, 0, -100.0000000000]) {
							cylinder(h = 200, r = 3.2500000000);
						}
						translate(v = [0, 0, -5]) {
							#linear_extrude(height = 5) {
								polygon(points = [[5.9142500000, 0.0000000000], [2.9571250000, 5.1218907443], [-2.9571250000, 5.1218907443], [-5.9142500000, 0.0000000000], [-2.9571250000, -5.1218907443], [2.9571250000, -5.1218907443]]);
							}
						}
						#translate(v = [-2.8750000000, -5.0000000000, -5.3000000000]) {
							cube(size = [5.7500000000, 10, 0.3000000000]);
						}
						#translate(v = [-2.8750000000, -2.8750000000, -5.6000000000]) {
							cube(size = [5.7500000000, 5.7500000000, 0.3000000000]);
						}
						#translate(v = [-2.8750000000, -5.0000000000, 0]) {
							cube(size = [5.7500000000, 10, 0.3000000000]);
						}
						#translate(v = [-2.8750000000, -2.8750000000, 0.3000000000]) {
							cube(size = [5.7500000000, 5.7500000000, 0.3000000000]);
						}
						#translate(v = [0, 0, -100.0000000000]) {
							cylinder(h = 200, r = 3.2500000000);
						}
						#translate(v = [-2.8750000000, -5.0000000000, -5.3000000000]) {
							cube(size = [5.7500000000, 10, 0.3000000000]);
						}
						#translate(v = [-2.8750000000, -2.8750000000, -5.6000000000]) {
							cube(size = [5.7500000000, 5.7500000000, 0.3000000000]);
						}
						#translate(v = [-2.8750000000, -5.0000000000, 0]) {
							cube(size = [5.7500000000, 10, 0.3000000000]);
						}
						#translate(v = [-2.8750000000, -2.8750000000, 0.3000000000]) {
							cube(size = [5.7500000000, 5.7500000000, 0.3000000000]);
						}
						#translate(v = [0, 0, -100.0000000000]) {
							cylinder(h = 200, r = 3.2500000000);
						}
					}
					union();
				}
			}
		}
	}
}
